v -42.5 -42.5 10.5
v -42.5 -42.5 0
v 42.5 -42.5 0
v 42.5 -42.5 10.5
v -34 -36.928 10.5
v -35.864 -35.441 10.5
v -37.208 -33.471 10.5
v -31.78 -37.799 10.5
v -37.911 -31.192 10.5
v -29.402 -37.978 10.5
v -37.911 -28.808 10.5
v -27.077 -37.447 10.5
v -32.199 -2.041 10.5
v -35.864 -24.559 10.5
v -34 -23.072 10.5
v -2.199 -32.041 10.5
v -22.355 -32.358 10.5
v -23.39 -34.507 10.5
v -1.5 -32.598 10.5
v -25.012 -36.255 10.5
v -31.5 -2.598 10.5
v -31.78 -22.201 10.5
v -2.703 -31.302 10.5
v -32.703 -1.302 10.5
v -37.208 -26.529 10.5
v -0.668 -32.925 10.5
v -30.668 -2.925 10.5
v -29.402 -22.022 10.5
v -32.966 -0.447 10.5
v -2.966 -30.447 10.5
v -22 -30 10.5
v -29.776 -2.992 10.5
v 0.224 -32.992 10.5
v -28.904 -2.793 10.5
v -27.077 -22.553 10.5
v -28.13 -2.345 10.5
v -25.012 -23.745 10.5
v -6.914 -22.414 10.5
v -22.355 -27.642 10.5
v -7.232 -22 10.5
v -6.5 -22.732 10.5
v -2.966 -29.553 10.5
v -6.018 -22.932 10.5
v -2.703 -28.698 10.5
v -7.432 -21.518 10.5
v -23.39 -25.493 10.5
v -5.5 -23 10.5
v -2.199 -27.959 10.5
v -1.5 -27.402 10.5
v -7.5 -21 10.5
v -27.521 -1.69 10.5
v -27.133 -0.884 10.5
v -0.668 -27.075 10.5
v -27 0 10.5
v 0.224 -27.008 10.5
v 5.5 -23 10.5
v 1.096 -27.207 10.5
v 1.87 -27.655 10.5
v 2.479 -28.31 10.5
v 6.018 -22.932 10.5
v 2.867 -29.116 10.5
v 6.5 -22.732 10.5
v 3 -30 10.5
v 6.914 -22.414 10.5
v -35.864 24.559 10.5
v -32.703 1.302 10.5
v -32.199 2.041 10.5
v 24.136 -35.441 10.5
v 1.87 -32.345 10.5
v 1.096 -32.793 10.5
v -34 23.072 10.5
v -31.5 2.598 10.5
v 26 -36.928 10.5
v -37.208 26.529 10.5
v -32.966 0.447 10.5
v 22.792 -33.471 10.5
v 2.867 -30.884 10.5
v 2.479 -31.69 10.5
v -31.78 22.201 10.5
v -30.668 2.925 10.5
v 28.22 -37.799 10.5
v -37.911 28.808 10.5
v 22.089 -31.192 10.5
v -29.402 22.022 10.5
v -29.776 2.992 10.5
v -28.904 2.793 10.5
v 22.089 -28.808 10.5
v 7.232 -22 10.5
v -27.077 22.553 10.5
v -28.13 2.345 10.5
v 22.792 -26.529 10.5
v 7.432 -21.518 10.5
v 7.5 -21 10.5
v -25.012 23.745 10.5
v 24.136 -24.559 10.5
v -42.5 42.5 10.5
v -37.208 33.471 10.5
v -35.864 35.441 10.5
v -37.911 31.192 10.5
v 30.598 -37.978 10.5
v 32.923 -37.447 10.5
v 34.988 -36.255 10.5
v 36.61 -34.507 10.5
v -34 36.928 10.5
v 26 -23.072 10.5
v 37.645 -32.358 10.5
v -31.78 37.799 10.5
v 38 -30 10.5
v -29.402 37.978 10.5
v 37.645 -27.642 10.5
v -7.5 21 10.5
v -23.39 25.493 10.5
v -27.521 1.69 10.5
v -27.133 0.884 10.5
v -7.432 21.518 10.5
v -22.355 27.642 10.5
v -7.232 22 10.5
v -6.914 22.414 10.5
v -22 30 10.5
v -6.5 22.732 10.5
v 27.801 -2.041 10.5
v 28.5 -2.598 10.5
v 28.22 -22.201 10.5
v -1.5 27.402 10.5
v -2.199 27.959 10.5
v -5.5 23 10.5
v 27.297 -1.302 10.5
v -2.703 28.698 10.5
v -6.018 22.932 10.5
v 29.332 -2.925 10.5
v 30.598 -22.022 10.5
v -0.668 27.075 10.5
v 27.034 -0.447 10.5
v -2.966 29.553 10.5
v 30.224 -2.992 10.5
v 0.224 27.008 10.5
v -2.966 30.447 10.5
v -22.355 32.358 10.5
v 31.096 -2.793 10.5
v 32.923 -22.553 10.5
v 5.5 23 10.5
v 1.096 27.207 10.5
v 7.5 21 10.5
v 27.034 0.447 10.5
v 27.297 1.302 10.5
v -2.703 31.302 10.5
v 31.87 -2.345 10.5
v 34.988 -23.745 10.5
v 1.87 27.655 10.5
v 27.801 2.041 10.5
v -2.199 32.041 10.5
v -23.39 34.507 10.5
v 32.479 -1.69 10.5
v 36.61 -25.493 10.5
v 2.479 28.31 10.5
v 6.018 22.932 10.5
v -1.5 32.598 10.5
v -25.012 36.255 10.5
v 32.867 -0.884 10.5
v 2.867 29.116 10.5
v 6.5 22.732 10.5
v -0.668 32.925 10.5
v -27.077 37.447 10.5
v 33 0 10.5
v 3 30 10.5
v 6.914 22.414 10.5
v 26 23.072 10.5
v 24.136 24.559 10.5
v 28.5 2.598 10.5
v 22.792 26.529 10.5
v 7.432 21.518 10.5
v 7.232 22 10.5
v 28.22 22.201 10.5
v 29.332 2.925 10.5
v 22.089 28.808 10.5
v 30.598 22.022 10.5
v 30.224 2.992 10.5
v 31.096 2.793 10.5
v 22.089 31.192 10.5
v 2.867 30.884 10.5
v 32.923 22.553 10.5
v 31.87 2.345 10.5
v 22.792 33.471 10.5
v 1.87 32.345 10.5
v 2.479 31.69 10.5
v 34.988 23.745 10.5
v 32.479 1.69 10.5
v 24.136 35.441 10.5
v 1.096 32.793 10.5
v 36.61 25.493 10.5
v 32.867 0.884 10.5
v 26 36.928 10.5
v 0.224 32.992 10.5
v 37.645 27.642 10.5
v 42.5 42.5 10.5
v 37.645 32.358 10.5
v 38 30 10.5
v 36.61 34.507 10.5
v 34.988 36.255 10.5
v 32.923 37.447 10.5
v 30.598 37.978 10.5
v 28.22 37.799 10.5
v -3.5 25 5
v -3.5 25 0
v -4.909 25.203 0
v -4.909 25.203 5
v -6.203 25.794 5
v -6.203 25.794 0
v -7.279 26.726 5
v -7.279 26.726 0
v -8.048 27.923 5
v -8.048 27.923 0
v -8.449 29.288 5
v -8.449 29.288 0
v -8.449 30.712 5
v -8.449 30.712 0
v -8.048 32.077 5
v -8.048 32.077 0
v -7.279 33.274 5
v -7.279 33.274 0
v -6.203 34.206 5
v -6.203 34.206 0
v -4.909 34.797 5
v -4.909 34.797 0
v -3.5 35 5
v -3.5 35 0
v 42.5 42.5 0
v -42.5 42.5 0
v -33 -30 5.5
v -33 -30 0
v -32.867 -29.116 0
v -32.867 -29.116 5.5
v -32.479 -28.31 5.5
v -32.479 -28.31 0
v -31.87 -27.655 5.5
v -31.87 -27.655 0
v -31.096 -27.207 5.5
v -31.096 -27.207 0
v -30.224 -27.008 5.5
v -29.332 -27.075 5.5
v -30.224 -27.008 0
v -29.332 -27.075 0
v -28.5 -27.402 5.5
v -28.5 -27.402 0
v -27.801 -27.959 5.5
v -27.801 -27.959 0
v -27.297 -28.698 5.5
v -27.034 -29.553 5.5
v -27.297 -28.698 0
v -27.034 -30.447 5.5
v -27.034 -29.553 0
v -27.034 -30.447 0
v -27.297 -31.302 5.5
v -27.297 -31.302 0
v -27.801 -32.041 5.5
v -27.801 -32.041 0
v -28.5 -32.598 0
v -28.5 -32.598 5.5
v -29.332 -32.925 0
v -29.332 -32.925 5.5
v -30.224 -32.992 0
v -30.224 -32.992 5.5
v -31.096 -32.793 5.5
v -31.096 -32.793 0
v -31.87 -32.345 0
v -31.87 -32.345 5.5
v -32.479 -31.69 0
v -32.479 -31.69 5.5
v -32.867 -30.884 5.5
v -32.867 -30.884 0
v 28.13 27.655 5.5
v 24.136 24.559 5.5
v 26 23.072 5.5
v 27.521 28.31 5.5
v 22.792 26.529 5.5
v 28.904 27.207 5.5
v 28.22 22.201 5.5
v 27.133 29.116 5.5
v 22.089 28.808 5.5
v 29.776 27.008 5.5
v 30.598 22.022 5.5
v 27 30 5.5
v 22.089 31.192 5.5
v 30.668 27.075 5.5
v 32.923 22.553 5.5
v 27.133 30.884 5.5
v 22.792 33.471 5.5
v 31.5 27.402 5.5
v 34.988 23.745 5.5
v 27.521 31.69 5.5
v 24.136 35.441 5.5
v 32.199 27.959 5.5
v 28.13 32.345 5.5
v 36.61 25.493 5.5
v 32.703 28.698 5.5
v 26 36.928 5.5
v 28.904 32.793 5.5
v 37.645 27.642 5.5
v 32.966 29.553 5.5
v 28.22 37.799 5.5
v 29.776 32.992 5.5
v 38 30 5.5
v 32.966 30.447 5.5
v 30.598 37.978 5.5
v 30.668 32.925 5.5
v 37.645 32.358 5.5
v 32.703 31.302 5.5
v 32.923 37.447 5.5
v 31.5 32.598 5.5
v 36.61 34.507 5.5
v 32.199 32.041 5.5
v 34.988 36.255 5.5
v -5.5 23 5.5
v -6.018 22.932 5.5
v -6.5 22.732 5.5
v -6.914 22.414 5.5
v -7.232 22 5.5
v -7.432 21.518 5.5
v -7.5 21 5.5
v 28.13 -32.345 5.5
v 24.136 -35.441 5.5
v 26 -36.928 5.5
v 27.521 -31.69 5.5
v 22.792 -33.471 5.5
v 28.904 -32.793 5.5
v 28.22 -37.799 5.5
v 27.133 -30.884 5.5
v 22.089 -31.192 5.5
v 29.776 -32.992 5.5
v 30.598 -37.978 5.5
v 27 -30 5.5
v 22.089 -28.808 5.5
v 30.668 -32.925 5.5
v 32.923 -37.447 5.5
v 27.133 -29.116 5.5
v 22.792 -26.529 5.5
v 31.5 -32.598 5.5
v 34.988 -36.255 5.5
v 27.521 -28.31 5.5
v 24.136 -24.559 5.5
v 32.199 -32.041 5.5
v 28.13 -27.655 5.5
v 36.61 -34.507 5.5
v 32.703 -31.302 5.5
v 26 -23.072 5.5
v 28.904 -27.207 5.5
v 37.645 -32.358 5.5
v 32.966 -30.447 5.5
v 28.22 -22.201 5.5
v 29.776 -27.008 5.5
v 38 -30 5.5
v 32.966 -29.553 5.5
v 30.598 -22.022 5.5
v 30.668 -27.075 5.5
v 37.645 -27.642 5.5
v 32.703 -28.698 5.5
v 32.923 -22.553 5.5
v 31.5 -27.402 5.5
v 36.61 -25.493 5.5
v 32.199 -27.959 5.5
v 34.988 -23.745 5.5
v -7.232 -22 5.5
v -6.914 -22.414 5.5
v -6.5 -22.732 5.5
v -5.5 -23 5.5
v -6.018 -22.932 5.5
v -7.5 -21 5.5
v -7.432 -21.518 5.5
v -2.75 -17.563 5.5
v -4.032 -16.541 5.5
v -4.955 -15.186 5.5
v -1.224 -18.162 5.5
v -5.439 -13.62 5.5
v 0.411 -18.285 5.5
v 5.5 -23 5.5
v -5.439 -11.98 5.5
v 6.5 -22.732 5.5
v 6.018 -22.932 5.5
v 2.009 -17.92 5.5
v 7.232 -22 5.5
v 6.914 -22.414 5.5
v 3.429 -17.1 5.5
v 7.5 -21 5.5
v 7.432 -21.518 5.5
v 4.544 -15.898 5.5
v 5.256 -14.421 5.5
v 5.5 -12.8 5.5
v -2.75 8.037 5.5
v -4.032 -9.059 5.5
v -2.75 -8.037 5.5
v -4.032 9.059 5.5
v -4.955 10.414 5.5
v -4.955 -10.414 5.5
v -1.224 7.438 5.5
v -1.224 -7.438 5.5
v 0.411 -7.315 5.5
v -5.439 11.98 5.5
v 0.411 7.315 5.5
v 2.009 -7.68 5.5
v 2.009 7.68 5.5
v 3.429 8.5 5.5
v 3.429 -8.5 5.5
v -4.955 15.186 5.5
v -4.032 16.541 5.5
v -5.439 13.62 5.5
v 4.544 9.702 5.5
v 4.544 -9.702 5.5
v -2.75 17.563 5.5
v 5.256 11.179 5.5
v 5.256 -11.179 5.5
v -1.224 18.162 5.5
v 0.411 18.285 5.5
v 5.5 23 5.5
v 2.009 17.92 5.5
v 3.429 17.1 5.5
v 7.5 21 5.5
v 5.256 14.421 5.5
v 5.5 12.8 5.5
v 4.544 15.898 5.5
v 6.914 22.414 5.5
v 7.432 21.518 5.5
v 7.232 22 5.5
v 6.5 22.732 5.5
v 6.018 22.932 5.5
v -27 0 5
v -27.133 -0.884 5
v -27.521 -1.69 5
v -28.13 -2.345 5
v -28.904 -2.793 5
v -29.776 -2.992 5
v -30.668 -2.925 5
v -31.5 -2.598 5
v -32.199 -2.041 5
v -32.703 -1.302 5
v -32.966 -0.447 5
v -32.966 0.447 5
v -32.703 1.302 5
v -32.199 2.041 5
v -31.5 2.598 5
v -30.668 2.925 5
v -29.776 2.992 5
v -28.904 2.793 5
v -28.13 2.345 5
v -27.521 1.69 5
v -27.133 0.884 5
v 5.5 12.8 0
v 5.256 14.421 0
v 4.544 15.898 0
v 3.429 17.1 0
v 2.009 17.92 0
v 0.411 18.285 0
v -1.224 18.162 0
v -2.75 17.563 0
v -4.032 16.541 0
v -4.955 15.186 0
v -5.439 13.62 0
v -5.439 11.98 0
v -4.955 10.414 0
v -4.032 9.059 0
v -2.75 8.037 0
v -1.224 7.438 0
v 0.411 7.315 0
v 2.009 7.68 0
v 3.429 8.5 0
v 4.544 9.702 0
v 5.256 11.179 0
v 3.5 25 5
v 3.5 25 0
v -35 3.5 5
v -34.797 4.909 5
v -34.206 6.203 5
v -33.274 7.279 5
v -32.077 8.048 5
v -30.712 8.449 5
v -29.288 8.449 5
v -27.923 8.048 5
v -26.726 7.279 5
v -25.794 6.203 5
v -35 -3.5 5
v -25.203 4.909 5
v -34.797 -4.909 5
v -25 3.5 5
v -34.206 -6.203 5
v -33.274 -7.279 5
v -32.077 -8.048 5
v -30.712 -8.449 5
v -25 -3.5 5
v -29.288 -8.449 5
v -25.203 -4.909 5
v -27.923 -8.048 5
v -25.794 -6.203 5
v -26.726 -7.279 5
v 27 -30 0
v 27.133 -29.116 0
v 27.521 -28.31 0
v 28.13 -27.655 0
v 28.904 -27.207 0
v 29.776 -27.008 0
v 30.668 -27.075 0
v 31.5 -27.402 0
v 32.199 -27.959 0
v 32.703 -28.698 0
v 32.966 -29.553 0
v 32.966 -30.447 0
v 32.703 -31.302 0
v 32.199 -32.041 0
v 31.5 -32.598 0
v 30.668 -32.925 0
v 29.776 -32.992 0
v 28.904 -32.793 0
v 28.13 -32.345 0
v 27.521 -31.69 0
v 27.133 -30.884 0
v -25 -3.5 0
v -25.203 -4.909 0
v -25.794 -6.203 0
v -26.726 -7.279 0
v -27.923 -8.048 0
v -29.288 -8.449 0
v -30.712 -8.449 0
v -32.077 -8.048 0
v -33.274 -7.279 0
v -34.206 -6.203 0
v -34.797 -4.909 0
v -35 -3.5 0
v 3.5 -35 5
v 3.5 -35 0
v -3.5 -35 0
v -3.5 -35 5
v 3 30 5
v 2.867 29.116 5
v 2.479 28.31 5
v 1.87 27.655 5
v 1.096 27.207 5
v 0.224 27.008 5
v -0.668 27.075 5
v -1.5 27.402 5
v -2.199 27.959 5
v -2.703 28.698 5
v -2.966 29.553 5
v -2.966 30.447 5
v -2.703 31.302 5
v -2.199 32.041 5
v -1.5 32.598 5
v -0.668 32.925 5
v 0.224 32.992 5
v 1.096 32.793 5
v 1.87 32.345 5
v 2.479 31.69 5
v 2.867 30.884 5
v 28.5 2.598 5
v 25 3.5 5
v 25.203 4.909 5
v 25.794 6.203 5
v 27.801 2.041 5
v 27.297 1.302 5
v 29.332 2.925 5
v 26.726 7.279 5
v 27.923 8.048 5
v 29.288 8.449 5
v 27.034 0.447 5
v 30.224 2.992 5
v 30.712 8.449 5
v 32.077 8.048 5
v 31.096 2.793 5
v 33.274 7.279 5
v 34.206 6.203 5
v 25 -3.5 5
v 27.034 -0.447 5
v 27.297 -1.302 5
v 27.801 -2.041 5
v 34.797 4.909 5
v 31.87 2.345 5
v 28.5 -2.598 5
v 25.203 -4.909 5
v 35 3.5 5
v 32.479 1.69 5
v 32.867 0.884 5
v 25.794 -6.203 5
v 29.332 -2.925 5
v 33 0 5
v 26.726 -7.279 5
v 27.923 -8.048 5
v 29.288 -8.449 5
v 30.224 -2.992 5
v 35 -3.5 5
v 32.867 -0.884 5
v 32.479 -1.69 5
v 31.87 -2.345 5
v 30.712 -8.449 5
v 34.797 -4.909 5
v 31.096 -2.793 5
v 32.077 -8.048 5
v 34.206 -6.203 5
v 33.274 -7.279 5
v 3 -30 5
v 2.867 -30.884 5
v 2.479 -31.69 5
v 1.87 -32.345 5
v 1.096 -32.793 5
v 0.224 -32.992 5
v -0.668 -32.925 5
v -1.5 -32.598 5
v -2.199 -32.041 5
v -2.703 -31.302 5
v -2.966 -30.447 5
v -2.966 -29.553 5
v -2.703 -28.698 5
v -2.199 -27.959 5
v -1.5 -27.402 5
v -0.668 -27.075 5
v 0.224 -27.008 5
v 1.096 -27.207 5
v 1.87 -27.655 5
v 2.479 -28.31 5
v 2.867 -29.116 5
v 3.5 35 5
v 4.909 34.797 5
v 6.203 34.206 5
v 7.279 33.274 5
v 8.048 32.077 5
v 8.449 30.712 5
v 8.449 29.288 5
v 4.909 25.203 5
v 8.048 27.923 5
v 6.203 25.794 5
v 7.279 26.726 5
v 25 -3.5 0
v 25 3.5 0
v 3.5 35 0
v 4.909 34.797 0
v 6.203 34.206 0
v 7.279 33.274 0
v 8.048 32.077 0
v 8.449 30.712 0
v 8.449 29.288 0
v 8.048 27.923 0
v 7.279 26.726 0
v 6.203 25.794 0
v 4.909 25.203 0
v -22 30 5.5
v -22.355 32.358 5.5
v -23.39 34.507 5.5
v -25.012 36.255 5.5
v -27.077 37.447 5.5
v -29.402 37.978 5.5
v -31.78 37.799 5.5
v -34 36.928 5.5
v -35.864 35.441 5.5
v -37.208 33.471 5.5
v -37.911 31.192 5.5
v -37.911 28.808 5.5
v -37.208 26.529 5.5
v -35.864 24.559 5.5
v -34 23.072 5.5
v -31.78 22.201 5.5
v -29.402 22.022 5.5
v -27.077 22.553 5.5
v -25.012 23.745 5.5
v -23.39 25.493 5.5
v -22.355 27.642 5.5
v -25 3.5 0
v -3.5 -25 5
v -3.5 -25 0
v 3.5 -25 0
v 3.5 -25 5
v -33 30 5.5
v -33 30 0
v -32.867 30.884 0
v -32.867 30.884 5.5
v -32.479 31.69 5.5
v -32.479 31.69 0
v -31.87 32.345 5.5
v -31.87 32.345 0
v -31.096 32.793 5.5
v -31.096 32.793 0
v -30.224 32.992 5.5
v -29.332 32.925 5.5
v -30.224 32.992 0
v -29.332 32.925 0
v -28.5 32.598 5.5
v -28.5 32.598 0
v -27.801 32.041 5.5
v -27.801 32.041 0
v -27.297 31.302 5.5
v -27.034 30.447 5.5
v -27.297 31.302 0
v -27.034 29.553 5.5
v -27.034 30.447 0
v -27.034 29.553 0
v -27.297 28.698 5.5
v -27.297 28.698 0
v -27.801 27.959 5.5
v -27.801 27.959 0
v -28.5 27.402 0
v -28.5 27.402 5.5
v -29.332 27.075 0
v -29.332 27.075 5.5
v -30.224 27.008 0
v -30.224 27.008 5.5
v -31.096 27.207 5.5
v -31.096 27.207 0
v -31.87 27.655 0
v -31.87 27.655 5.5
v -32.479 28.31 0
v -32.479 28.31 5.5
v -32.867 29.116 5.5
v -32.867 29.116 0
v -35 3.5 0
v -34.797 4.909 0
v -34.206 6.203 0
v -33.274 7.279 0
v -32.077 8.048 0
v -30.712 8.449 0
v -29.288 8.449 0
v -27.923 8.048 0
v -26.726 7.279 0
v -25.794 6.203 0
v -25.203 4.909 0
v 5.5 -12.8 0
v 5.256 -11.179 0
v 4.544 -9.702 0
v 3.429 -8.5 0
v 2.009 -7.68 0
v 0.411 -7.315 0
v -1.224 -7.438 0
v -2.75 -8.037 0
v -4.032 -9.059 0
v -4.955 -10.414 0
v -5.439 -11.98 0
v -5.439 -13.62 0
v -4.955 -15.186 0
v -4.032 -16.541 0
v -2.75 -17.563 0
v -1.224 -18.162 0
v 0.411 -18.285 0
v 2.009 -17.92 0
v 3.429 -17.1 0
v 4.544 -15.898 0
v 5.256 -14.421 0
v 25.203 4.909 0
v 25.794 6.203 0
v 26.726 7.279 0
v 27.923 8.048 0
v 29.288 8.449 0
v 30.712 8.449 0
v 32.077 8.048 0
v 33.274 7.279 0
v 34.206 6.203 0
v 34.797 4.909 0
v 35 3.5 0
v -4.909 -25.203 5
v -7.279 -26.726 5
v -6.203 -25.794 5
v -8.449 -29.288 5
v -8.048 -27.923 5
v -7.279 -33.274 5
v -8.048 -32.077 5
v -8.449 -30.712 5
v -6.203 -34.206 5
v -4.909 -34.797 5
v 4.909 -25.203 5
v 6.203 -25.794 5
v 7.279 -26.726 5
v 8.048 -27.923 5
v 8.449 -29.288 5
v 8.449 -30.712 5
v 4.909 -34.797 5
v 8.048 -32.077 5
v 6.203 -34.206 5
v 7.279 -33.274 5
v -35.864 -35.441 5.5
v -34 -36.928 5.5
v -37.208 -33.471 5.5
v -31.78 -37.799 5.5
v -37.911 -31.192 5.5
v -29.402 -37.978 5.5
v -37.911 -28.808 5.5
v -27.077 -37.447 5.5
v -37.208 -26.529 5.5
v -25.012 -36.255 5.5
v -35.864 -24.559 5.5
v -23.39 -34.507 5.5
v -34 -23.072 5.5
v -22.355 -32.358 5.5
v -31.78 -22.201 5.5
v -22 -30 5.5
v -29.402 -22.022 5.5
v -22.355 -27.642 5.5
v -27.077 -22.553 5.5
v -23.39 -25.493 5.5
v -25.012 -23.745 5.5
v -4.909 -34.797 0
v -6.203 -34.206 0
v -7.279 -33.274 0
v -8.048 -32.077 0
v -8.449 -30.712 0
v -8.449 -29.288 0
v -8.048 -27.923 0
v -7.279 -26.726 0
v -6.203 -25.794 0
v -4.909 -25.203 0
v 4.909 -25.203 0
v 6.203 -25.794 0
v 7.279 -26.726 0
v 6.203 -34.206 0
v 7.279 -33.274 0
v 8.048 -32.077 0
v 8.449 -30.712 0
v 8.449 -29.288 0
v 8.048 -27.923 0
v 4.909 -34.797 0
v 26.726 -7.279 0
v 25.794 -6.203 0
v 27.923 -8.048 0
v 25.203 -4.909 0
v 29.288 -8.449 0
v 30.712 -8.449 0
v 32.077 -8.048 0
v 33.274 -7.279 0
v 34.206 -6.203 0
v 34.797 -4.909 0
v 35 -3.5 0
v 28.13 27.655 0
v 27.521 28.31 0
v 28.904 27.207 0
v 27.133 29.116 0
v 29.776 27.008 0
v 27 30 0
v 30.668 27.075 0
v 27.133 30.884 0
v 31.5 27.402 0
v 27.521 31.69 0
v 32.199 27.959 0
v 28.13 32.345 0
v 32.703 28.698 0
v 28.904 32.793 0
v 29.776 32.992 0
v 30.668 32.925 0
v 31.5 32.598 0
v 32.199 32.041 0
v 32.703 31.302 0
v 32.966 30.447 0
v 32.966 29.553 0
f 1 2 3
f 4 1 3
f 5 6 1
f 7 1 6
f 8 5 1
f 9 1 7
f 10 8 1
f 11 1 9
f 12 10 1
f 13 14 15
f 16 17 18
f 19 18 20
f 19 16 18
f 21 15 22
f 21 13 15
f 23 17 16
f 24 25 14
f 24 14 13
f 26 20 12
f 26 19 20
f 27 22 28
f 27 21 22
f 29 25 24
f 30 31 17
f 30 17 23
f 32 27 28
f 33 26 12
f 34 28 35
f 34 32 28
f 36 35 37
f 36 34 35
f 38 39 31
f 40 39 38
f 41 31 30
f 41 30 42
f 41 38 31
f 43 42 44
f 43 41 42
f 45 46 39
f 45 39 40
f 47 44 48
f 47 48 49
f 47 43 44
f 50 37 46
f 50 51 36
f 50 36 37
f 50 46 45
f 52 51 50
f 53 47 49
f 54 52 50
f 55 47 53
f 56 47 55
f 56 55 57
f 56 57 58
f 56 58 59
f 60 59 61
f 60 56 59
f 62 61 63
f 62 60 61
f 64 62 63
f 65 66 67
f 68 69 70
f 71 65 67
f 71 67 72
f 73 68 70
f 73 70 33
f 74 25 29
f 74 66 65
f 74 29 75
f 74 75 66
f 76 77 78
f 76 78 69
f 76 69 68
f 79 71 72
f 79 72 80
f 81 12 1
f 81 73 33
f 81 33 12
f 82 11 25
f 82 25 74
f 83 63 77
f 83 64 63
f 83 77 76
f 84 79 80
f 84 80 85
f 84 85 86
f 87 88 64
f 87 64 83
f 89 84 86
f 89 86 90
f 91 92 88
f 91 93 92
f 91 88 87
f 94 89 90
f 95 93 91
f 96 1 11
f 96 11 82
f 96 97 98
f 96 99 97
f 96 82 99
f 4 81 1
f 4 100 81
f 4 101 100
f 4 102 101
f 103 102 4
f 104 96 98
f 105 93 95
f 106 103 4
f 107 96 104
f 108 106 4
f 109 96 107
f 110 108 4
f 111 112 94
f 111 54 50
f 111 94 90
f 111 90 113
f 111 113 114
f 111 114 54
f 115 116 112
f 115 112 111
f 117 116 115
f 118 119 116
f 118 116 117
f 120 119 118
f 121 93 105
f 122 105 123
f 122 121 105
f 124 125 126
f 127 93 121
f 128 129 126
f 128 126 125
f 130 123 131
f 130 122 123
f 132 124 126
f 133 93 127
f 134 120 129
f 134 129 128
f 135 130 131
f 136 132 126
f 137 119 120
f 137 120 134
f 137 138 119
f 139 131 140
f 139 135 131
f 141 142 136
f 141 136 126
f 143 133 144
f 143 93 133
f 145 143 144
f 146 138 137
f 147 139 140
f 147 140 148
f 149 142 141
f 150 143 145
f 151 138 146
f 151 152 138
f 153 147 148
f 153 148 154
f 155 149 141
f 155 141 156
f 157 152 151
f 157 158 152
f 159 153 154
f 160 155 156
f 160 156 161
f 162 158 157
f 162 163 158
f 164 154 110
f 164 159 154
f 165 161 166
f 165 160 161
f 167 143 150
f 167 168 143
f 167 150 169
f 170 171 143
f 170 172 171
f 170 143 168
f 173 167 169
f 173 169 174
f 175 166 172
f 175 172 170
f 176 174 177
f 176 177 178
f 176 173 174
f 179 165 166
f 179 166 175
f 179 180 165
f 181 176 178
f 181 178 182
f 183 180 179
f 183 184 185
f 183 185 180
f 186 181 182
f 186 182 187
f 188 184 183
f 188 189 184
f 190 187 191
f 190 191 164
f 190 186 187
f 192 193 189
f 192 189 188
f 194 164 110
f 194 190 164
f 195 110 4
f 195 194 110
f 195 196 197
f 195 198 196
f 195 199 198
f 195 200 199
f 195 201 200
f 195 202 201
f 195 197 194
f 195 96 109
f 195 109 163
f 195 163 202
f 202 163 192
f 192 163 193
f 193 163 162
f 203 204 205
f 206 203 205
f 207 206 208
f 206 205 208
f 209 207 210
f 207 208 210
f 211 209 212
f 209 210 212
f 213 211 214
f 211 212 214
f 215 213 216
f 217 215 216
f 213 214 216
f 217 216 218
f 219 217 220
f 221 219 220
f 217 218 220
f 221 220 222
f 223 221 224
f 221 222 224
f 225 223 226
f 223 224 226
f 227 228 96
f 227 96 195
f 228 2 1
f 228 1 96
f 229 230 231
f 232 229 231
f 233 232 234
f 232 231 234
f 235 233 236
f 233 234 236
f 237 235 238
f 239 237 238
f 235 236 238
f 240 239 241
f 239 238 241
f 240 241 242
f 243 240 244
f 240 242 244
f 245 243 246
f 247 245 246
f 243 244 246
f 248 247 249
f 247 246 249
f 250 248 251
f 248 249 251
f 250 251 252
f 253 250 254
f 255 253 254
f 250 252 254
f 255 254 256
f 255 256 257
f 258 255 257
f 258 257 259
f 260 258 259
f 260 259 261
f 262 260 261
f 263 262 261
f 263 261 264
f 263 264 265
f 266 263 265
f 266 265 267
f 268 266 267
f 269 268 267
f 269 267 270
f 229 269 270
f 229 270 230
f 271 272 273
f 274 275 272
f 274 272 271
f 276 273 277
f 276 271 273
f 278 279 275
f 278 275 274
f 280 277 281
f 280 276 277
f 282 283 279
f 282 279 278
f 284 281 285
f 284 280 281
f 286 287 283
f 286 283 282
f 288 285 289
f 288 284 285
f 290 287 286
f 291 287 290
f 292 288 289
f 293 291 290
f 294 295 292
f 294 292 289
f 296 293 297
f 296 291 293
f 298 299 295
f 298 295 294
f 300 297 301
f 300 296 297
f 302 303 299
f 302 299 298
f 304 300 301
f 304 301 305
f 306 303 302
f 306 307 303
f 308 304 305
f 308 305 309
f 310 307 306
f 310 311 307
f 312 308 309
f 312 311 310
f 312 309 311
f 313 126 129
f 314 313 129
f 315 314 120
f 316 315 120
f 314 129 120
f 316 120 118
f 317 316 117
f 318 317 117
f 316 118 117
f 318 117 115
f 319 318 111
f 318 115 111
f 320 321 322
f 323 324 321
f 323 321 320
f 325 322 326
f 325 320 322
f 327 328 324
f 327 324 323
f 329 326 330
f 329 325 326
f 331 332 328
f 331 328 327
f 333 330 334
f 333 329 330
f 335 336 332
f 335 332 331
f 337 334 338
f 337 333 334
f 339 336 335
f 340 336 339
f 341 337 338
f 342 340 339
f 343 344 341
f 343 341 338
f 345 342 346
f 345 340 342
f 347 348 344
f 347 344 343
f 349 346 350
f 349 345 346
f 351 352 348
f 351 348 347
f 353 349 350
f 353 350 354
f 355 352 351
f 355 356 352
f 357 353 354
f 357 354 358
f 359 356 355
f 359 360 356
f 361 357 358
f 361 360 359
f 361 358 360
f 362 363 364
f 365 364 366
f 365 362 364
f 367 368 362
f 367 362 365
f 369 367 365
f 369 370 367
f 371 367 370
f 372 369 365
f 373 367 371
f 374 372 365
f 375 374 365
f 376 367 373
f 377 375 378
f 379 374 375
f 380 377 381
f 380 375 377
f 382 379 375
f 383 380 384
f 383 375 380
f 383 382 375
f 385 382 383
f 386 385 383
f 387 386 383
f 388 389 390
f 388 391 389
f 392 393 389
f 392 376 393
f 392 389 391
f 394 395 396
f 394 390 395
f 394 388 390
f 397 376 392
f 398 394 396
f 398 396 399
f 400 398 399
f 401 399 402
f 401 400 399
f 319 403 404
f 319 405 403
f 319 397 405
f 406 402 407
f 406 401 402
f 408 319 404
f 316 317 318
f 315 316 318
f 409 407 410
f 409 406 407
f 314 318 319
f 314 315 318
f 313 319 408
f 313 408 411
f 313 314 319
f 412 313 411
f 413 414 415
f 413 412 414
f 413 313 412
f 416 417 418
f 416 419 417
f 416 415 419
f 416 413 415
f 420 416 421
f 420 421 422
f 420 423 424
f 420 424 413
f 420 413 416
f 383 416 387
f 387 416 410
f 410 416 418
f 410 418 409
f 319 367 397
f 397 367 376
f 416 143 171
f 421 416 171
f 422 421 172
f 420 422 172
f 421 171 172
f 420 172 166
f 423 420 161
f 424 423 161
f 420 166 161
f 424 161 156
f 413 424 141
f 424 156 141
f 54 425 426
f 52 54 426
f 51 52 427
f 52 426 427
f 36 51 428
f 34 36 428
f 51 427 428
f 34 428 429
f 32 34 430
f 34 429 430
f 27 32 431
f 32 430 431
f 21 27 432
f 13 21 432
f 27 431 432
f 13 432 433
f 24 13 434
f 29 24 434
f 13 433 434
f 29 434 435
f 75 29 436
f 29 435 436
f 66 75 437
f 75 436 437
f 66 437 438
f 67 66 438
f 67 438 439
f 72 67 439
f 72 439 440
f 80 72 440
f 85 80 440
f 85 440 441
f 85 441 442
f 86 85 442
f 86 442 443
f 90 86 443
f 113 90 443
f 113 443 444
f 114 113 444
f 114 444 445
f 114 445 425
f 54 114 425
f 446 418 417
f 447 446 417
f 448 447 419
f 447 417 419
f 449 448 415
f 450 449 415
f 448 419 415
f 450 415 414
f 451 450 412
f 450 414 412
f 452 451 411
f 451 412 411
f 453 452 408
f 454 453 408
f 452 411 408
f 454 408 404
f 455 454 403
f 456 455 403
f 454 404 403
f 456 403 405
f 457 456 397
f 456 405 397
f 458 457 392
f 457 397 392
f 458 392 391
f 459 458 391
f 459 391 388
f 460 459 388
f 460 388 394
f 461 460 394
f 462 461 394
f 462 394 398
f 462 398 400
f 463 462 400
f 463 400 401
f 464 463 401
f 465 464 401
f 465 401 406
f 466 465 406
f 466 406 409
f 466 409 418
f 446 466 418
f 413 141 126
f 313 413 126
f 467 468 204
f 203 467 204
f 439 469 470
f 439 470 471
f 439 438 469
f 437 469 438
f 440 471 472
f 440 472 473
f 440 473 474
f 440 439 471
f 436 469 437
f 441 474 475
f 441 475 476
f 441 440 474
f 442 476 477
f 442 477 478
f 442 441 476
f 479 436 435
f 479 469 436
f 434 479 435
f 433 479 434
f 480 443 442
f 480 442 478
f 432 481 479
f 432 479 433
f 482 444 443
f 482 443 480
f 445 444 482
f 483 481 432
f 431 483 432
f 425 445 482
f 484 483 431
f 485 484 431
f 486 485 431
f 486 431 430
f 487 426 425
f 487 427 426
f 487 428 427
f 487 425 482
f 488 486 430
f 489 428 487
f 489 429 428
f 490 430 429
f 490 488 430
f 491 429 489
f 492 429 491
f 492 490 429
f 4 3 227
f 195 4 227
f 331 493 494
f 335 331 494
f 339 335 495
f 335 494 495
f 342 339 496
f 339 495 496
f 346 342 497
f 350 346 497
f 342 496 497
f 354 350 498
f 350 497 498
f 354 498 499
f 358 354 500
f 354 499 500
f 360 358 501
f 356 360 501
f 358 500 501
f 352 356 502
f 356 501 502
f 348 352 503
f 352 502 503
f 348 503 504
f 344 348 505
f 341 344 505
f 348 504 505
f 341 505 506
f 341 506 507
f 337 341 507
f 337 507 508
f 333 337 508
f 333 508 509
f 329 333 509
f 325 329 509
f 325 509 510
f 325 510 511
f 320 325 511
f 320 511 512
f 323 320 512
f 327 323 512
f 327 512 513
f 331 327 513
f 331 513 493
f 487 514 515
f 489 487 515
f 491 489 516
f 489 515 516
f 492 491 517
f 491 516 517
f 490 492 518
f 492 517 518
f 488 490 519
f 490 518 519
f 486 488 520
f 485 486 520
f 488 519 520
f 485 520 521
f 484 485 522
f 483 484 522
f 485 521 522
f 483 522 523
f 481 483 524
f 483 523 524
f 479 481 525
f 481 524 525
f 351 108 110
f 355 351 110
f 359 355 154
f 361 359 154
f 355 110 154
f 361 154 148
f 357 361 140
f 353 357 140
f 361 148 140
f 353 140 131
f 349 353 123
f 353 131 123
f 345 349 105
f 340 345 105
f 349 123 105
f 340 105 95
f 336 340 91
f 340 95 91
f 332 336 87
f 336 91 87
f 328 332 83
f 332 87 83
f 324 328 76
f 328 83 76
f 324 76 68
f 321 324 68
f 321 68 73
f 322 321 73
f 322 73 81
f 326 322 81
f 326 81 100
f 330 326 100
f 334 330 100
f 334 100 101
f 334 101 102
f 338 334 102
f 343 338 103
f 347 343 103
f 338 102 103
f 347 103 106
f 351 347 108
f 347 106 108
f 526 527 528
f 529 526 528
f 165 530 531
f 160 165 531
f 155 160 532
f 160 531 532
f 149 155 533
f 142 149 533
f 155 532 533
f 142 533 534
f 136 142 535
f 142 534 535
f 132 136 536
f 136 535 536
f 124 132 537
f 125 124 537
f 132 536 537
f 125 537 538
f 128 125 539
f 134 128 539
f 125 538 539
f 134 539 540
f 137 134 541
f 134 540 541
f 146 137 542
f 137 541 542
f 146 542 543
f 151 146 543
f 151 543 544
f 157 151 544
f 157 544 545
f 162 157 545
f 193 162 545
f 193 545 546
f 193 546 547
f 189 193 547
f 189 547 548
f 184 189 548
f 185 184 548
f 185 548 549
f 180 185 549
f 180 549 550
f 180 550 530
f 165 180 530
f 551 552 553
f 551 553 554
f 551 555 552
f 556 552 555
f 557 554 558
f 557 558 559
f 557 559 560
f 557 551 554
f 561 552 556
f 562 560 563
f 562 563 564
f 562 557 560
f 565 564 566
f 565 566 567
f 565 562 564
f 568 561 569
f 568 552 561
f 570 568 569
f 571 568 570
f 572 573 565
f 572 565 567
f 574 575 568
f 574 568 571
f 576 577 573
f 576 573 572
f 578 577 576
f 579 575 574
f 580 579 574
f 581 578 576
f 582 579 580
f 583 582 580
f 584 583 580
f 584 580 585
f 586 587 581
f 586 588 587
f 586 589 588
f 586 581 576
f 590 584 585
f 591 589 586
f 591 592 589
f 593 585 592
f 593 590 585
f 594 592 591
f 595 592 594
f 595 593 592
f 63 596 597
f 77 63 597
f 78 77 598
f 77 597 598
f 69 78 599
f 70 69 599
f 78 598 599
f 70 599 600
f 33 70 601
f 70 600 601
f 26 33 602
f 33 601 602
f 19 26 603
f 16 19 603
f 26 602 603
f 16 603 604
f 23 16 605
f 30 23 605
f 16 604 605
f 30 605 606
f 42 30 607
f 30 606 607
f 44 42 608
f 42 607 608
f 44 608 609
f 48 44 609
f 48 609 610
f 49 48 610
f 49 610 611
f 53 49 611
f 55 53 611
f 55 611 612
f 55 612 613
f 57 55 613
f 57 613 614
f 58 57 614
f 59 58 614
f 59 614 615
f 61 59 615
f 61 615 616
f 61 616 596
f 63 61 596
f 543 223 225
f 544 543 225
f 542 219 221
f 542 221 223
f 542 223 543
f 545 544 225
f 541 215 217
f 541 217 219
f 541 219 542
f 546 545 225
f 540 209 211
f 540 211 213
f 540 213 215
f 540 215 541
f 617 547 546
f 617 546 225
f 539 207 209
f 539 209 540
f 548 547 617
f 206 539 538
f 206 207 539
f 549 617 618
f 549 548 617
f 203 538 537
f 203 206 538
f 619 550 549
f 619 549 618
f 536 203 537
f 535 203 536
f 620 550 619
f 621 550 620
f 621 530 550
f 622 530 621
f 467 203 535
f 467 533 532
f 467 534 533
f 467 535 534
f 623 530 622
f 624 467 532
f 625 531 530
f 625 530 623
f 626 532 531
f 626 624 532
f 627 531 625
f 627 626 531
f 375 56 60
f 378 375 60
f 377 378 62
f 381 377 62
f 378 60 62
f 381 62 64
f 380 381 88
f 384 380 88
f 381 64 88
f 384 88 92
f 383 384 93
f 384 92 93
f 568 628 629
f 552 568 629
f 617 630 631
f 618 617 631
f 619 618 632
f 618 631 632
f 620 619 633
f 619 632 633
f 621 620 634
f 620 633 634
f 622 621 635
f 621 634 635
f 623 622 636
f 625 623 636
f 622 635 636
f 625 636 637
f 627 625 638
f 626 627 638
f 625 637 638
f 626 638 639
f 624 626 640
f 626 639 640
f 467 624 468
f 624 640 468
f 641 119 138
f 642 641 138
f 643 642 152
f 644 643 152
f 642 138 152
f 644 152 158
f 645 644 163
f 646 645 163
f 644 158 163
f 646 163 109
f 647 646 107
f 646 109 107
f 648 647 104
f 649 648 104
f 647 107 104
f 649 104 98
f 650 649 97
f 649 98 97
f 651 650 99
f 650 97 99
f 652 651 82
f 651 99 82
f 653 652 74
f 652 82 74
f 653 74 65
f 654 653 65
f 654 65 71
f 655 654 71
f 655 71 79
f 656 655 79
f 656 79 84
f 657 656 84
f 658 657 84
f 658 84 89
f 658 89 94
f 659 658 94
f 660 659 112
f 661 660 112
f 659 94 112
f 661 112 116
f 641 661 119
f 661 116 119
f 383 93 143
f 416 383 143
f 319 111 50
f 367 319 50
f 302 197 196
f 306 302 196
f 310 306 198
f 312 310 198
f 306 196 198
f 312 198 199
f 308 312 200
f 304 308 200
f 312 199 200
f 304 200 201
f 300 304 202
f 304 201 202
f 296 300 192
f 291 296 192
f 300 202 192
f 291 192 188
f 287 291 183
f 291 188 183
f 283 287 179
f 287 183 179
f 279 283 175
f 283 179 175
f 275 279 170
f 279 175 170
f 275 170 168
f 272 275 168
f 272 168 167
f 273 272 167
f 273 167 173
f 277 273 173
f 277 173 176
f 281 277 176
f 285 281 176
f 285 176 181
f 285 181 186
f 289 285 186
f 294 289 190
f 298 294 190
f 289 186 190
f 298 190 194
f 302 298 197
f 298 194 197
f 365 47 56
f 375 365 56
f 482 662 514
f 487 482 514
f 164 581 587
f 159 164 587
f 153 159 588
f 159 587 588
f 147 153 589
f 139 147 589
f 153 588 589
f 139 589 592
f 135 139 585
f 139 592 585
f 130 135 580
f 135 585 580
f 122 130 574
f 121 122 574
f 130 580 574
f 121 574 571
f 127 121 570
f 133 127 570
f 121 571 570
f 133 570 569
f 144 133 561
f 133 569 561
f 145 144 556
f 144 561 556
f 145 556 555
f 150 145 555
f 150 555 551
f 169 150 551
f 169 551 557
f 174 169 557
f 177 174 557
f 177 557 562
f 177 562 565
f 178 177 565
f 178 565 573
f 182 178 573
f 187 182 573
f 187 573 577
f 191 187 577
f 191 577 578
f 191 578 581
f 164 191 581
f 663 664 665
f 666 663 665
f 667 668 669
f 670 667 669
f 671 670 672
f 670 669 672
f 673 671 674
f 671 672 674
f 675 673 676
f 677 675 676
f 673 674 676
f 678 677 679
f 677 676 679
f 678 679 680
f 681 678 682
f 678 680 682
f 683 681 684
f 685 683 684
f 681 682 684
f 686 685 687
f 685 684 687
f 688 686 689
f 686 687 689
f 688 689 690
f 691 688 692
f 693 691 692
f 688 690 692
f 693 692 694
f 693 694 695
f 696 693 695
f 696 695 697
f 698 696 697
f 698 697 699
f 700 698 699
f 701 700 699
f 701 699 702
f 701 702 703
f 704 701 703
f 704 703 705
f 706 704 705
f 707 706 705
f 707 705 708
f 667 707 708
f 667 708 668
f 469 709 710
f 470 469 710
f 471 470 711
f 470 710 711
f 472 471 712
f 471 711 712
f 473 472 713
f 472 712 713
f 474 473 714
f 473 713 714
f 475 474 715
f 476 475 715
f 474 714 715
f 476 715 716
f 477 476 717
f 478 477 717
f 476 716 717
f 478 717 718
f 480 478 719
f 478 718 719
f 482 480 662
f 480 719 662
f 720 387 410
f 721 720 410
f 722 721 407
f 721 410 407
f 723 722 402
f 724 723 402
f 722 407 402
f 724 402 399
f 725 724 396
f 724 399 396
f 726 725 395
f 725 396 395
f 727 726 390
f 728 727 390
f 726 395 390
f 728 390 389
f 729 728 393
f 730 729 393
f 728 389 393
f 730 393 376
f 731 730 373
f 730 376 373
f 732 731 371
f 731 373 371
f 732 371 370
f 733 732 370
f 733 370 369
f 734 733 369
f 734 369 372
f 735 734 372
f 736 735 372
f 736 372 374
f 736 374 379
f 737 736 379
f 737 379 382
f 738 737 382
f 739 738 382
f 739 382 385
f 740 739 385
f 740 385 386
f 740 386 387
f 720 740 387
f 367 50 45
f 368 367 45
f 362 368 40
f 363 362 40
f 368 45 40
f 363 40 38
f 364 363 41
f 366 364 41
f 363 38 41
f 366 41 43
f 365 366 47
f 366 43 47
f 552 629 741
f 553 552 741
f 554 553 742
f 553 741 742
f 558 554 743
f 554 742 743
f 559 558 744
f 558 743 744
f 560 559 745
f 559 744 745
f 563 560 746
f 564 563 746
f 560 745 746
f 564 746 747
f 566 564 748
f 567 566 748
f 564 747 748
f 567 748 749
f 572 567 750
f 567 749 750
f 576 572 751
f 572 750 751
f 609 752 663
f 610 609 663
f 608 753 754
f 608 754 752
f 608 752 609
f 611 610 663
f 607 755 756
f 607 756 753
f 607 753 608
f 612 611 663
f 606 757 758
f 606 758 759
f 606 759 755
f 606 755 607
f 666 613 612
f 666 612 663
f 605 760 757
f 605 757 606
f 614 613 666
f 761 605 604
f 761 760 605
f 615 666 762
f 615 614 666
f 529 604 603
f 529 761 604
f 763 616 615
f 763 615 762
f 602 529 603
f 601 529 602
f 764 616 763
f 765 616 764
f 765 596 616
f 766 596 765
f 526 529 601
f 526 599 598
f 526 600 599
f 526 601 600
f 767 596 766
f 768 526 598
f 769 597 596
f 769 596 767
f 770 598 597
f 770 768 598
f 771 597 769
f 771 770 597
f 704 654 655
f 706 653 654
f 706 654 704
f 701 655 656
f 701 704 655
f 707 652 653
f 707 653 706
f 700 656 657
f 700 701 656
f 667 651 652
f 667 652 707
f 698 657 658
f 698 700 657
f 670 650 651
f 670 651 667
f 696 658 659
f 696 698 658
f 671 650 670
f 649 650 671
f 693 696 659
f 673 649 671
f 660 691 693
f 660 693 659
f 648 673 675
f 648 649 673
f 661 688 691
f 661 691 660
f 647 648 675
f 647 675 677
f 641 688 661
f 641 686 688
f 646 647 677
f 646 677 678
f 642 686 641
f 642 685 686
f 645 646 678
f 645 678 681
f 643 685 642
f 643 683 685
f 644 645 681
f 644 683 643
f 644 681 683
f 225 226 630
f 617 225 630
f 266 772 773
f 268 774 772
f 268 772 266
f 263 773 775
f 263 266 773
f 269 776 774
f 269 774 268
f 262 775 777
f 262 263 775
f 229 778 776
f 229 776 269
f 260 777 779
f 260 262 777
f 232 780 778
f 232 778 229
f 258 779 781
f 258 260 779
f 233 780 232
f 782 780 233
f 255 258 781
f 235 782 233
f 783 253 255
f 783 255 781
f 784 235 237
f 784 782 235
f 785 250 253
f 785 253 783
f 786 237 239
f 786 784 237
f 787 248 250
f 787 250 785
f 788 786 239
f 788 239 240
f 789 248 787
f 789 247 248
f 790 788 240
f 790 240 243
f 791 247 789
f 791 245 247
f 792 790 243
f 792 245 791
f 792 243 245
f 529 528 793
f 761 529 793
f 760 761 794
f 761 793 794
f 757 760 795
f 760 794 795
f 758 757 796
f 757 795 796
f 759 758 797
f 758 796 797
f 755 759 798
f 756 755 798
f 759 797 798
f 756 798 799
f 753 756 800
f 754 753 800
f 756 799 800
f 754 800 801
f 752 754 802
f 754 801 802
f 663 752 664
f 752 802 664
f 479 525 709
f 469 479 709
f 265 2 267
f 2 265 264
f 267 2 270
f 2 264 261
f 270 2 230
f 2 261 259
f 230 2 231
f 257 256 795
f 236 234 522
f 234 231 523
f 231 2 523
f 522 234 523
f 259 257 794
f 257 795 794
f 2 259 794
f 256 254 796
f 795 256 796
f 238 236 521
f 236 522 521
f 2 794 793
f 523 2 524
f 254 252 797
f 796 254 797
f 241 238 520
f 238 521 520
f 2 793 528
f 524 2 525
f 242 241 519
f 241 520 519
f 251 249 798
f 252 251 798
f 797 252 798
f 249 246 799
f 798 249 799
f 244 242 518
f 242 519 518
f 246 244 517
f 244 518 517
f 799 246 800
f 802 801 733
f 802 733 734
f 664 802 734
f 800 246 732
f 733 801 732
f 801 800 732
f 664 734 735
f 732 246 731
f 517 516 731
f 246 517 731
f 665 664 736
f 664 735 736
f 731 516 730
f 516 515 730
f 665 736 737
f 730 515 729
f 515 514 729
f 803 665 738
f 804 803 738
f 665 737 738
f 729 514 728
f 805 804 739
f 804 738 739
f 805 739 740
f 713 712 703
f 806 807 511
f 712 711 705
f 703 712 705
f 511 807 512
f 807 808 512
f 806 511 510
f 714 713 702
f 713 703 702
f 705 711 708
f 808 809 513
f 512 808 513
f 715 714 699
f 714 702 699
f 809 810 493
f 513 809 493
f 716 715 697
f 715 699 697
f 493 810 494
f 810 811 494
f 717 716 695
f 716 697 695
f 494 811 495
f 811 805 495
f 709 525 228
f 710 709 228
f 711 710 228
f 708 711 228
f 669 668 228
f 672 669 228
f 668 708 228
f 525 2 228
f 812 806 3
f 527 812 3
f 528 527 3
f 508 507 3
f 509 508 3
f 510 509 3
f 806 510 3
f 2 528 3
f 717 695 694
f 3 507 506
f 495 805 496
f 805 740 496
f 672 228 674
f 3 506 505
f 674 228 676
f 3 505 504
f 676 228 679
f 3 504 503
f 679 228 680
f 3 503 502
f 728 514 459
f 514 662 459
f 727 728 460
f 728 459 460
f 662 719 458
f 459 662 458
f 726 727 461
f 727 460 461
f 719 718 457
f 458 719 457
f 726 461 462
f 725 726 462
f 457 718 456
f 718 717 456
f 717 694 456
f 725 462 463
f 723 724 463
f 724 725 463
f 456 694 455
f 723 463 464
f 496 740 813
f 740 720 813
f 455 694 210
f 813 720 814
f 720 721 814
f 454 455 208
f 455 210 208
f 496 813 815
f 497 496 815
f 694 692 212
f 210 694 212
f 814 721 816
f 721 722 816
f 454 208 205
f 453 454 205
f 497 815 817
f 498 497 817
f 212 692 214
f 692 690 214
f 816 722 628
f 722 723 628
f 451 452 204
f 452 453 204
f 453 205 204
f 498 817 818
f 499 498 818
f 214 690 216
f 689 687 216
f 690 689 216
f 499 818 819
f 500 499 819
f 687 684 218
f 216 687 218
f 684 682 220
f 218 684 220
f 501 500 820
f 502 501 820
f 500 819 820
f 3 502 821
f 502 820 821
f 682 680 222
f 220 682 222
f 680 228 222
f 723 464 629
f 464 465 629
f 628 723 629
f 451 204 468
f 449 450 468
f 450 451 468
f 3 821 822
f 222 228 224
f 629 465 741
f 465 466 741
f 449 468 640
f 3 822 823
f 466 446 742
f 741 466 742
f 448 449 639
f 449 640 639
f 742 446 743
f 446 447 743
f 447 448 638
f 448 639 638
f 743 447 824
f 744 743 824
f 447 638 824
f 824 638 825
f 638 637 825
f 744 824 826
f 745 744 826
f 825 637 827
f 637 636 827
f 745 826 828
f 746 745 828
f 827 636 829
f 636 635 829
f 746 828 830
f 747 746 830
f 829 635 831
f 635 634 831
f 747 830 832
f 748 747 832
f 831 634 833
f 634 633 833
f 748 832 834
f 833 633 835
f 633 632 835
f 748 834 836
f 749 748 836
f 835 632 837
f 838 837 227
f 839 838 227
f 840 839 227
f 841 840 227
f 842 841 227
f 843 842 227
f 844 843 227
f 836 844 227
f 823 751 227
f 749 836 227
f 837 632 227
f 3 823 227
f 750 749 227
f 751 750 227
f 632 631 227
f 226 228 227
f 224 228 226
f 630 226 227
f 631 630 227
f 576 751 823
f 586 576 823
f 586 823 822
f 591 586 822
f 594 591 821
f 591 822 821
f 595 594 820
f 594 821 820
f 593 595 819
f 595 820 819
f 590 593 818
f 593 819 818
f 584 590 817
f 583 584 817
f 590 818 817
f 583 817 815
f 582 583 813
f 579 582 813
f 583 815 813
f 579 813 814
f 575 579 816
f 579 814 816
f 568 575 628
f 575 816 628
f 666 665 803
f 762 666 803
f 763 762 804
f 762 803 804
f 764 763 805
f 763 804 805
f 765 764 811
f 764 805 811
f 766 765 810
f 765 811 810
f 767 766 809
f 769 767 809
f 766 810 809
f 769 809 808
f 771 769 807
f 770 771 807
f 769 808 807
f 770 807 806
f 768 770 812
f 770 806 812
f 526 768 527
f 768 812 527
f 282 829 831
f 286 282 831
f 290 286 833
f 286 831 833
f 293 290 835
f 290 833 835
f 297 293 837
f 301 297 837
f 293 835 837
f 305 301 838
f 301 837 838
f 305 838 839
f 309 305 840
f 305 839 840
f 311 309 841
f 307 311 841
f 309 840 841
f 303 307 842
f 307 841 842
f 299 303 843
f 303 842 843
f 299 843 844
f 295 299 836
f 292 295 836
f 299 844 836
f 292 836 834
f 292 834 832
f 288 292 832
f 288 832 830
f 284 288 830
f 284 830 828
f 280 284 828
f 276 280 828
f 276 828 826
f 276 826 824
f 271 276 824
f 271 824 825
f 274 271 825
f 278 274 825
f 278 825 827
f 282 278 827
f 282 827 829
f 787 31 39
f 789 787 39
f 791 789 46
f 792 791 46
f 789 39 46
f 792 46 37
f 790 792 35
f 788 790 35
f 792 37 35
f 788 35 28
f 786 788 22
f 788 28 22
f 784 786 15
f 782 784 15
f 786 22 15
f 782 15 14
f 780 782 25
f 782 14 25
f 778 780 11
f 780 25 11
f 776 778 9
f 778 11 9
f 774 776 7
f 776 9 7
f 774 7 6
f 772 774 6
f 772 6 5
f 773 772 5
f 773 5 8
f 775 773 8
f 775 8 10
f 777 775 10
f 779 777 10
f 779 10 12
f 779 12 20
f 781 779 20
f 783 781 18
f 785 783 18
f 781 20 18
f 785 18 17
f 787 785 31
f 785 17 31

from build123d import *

# Parameters (mm, degrees)
F0_W      = 85
F0_H      = 85
F1_DEPTH  = 10.5
F2_R      = 5.5
F3_DEPTH  = 10.501
F5_DEPTH  = 5
F6_R      = 8
F7_DEPTH  = 5
F8_D      = 6
F10_DEPTH = 5
F11_R     = 3
F12_DEPTH = 25


with BuildPart() as f1:
    # F0 (on Top) → F1 (new body)
    with BuildSketch(Plane.XY):
        Rectangle(F0_W, F0_H)
    extrude(amount=F1_DEPTH)

    # F2 (on face) → F3 (cut, through all)
    with BuildSketch(Plane.XY.offset(10.5)):
        with Locations((0, 12.8)):
            Circle(F2_R)
        with Locations((0, -12.8)):
            Circle(F2_R)
    extrude(amount=-F3_DEPTH, mode=Mode.SUBTRACT)

    # F4 (on face) → F5 (cut)
    with BuildSketch(Plane.XY.offset(10.5)):
        with BuildLine():
            Line((-5.5, -23), (5.5, -23))
            ThreePointArc((5.5, -23), (6.914214, -22.414214), (7.5, -21))
            Line((7.5, -21), (7.5, 21))
            ThreePointArc((7.5, 21), (6.914214, 22.414214), (5.5, 23))
            Line((5.5, 23), (-5.5, 23))
            ThreePointArc((-5.5, 23), (-6.914214, 22.414214), (-7.5, 21))
            Line((-7.5, 21), (-7.5, -21))
            ThreePointArc((-7.5, -21), (-6.914214, -22.414214), (-5.5, -23))
        make_face()
    extrude(amount=-F5_DEPTH, mode=Mode.SUBTRACT)

    # F6 (on face) → F7 (cut)
    with BuildSketch(Plane.XY.offset(10.5)):
        with Locations((30, 30)):
            Circle(F6_R)
        with Locations((30, -30)):
            Circle(F6_R)
        with Locations((-30, -30)):
            Circle(F6_R)
        with Locations((-30, 30)):
            Circle(F6_R)
    extrude(amount=-F7_DEPTH, mode=Mode.SUBTRACT)

    # F8 (through all)
    with Locations(Plane.XY.offset(10.5)):
        with Locations((-30, -30), (30, -30), (30, 30), (-30, 30)):
            Hole(F8_D / 2)

    # F9 (on face) → F10 (cut)
    with BuildSketch(Plane(origin=(0, 0, 0), x_dir=(1, 0, 0), z_dir=(0, 0, -1))):
        with BuildLine():
            ThreePointArc((35, 3.5), (30, 8.5), (25, 3.5))
            Line((25, 3.5), (25, -3.5))
            ThreePointArc((25, -3.5), (30, -8.5), (35, -3.5))
            Line((35, -3.5), (35, 3.5))
        make_face()
        with BuildLine():
            ThreePointArc((3.5, 25), (8.5, 30), (3.5, 35))
            Line((3.5, 35), (-3.5, 35))
            ThreePointArc((-3.5, 35), (-8.5, 30), (-3.5, 25))
            Line((-3.5, 25), (3.5, 25))
        make_face()
        with BuildLine():
            ThreePointArc((-25, 3.5), (-30, 8.5), (-35, 3.5))
            Line((-35, 3.5), (-35, -3.5))
            ThreePointArc((-35, -3.5), (-30, -8.5), (-25, -3.5))
            Line((-25, -3.5), (-25, 3.5))
        make_face()
        with BuildLine():
            Line((-3.5, -35), (3.5, -35))
            ThreePointArc((3.5, -35), (8.5, -30), (3.5, -25))
            Line((3.5, -25), (-3.5, -25))
            ThreePointArc((-3.5, -25), (-8.5, -30), (-3.5, -35))
        make_face()
    extrude(amount=-F10_DEPTH, mode=Mode.SUBTRACT)

    # F11 (on face) → F12 (cut)
    with BuildSketch(Plane(origin=(0, 0, 0), x_dir=(1, 0, 0), z_dir=(0, 0, -1))):
        with Locations((0, 30)):
            Circle(F11_R)
        with Locations((0, -30)):
            Circle(F11_R)
        with Locations((30, 0)):
            Circle(F11_R)
        with Locations((-30, 0)):
            Circle(F11_R)
    extrude(amount=-F12_DEPTH, mode=Mode.SUBTRACT)


solid = f1.part
